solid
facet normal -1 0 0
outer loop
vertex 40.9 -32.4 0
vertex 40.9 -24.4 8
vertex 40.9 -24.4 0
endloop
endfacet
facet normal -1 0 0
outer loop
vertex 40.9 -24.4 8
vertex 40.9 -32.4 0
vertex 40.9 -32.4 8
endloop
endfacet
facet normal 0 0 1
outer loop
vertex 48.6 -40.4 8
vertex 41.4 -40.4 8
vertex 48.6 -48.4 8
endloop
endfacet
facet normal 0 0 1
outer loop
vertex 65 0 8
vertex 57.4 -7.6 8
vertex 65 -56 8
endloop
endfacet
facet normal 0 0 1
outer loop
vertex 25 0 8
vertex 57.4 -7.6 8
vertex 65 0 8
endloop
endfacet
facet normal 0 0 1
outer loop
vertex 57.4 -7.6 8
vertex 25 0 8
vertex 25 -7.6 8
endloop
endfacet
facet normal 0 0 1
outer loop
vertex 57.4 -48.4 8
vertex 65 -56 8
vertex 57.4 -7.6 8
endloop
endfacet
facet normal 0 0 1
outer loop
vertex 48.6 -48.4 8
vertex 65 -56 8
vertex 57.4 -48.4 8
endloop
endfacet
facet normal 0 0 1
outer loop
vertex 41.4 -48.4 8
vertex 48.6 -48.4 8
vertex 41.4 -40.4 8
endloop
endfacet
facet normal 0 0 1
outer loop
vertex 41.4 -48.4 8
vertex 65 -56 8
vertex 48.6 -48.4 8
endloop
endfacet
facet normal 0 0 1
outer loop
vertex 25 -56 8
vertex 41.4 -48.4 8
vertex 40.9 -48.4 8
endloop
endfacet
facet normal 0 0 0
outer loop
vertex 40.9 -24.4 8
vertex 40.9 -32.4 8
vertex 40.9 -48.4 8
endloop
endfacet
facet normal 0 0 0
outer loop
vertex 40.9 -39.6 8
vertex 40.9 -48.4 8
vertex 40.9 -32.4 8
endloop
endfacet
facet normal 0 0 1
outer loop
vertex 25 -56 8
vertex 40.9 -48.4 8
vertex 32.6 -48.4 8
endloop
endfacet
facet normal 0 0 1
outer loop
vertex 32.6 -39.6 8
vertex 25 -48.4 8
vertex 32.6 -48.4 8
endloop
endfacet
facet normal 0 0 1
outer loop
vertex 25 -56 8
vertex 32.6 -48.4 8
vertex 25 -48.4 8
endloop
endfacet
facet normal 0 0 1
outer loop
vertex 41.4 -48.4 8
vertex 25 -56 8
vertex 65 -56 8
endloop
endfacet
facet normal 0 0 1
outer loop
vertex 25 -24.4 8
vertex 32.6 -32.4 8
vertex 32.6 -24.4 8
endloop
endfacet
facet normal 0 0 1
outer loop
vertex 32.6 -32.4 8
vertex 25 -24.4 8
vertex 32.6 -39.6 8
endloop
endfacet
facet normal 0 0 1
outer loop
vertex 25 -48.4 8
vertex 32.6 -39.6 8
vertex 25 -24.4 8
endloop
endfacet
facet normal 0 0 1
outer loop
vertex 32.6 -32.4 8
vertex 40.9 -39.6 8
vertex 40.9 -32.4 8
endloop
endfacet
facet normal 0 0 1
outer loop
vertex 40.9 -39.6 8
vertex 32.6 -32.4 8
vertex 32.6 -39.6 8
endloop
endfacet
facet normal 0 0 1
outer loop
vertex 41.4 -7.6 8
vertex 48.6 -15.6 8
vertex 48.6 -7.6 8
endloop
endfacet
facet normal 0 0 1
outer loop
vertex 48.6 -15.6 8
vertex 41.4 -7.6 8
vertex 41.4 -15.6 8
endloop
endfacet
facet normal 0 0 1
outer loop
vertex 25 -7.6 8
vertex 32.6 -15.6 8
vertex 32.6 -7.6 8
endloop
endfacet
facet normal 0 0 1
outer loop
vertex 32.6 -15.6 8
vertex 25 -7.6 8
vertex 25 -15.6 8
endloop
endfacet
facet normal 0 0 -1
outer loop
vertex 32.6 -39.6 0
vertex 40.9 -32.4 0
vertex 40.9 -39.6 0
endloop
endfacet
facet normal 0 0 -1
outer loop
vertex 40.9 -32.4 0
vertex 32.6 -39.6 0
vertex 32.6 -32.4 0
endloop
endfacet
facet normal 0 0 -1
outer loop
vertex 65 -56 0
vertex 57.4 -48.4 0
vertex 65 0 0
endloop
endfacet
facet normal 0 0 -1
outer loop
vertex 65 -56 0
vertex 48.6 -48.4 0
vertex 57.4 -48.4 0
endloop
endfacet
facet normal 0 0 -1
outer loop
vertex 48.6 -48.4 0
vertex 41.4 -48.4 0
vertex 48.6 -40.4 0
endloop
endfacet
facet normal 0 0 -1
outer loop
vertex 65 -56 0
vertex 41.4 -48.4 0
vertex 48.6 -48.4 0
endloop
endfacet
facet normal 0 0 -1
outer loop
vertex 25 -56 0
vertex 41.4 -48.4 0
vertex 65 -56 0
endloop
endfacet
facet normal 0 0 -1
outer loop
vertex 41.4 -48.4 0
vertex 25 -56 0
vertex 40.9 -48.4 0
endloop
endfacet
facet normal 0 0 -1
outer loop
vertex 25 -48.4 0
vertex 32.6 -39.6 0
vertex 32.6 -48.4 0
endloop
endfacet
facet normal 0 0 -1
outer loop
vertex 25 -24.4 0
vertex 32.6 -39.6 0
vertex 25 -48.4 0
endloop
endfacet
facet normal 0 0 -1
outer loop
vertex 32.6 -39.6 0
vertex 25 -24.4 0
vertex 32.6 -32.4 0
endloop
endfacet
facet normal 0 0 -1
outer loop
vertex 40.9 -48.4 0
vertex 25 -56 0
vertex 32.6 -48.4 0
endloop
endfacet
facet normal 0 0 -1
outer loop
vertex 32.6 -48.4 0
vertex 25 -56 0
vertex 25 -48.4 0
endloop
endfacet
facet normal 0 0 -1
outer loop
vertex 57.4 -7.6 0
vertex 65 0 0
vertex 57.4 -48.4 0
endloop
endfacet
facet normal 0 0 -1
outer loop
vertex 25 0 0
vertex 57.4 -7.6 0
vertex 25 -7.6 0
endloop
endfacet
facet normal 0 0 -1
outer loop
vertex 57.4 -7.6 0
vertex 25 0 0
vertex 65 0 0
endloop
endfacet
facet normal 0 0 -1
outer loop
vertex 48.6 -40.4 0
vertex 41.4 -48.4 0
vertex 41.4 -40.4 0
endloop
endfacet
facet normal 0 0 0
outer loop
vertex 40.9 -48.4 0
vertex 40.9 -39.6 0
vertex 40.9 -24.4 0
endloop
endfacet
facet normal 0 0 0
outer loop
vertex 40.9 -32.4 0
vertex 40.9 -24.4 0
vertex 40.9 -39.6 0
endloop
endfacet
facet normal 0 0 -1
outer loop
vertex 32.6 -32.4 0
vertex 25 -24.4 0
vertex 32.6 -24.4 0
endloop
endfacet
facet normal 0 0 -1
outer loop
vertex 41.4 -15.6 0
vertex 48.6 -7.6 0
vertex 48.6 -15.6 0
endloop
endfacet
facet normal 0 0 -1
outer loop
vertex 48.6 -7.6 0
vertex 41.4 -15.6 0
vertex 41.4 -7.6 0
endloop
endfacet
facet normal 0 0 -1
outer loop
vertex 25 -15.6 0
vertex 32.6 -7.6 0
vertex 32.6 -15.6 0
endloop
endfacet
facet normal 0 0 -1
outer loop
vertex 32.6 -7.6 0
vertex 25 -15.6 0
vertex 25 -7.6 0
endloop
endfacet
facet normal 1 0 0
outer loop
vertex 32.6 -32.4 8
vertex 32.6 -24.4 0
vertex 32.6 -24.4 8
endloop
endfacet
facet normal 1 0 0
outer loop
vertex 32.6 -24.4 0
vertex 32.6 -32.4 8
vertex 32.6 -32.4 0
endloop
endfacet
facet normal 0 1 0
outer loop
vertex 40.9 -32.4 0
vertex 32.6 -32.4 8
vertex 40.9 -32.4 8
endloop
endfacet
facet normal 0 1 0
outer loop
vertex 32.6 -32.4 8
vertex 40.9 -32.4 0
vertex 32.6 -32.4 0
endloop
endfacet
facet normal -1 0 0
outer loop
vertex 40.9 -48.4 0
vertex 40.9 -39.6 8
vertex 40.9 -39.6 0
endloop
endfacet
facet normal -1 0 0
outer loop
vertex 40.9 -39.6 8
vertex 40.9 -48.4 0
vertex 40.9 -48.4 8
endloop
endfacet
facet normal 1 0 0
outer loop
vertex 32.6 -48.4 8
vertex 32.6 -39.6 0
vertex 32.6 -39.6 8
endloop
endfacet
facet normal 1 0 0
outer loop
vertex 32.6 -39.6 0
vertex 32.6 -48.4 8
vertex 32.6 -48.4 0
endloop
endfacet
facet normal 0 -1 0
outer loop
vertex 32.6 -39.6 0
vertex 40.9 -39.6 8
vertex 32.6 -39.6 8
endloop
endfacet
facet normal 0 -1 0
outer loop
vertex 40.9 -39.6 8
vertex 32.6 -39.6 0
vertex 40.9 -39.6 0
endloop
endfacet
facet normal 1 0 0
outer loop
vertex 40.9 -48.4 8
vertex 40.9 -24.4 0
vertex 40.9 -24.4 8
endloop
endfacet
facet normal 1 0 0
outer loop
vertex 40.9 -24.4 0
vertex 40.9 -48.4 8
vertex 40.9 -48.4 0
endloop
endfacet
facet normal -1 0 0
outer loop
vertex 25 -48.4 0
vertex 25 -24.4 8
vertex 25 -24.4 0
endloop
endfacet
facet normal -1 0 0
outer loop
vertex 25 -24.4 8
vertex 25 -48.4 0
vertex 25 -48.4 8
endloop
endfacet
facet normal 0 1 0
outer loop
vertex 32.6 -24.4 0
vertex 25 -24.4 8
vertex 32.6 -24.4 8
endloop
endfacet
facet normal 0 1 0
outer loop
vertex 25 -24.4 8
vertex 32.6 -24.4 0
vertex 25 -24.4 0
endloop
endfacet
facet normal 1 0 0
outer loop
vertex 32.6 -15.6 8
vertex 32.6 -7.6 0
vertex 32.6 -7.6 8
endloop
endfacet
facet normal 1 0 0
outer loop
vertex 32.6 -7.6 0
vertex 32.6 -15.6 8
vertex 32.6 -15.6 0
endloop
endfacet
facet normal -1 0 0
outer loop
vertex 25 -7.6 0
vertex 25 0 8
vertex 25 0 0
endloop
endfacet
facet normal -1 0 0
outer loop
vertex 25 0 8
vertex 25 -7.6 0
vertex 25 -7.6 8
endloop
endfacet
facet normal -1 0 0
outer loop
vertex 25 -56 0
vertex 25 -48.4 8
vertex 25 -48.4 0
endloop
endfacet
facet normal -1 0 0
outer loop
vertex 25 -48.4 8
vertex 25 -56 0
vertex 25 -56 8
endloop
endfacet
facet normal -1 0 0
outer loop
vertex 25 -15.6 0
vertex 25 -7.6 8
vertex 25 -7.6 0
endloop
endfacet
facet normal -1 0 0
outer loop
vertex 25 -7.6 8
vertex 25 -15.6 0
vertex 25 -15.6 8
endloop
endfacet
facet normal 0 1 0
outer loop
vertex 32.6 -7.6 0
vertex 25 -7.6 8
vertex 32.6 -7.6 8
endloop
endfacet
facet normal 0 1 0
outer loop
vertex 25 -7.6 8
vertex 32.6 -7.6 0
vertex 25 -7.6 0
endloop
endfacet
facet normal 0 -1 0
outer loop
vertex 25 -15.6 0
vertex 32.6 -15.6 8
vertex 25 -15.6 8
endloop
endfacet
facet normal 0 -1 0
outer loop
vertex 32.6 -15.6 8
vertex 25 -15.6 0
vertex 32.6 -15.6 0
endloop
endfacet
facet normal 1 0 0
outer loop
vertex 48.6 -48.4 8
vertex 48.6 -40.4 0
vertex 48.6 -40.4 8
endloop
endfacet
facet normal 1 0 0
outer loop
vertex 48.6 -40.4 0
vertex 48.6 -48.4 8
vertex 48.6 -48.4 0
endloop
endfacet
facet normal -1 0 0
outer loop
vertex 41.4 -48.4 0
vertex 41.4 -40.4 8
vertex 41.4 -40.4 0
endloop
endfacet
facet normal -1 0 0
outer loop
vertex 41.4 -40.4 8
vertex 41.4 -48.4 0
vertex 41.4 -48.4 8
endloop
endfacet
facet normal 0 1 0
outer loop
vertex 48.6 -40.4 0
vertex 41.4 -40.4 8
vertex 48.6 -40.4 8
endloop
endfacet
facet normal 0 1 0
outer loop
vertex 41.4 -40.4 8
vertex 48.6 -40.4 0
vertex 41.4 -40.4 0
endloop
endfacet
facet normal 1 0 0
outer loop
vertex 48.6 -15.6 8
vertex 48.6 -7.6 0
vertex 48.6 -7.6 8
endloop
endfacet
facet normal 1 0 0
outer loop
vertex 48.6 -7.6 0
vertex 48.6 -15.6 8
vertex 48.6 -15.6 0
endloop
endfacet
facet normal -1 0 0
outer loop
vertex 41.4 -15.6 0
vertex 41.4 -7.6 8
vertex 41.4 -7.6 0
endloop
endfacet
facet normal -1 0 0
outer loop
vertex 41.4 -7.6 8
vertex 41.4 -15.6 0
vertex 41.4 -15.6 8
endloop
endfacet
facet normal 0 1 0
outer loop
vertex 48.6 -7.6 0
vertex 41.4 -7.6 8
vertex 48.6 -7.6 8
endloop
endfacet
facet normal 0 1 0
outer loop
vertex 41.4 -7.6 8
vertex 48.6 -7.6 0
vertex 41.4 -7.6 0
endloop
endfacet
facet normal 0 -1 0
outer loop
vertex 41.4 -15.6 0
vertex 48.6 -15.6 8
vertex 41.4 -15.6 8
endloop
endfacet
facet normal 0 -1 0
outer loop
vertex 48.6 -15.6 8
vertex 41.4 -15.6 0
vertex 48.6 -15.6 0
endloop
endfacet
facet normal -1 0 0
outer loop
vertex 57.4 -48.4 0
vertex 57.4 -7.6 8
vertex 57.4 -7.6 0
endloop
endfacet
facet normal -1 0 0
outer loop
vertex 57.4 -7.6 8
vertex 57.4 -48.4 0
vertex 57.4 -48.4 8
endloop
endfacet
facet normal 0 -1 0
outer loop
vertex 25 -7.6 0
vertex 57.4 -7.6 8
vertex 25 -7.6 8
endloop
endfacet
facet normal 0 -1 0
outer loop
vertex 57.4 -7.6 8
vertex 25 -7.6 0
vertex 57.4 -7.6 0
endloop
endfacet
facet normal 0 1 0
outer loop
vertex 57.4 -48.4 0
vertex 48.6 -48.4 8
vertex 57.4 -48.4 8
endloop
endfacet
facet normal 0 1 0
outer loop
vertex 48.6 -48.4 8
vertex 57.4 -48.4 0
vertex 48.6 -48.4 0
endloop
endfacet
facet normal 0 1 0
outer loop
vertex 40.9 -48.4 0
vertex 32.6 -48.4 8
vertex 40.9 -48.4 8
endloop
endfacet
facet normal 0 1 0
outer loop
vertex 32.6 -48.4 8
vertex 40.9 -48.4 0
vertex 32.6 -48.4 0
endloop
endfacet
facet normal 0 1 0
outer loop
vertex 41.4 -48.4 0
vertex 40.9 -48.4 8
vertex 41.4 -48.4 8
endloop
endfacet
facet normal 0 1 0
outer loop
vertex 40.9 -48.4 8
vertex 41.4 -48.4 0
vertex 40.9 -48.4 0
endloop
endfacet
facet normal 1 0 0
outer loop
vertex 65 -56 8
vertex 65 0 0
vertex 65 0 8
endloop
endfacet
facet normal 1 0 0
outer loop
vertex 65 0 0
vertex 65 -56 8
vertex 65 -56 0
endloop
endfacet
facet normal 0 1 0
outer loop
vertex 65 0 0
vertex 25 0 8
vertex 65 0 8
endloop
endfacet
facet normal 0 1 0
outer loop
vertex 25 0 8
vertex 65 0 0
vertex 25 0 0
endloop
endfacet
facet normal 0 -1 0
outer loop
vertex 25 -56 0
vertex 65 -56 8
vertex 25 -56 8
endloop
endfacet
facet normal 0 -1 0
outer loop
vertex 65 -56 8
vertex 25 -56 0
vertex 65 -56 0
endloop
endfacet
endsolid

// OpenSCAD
difference() {
  translate([45.0000000000, -28.0000000000, 4.0000000000]) {
    scale([40.0000000000, 56.0000000000, 8.0000000000]) {
      translate([-0.5000000000, -0.5000000000, -0.5000000000]) {
        cube([1, 1, 1]);
      }
    }
  }
  difference() {
    translate([41.1999210000, -27.9999180000, 4.0000000000]) {
      scale([32.4000000000, 40.8000000000, 8.0000000000]) {
        translate([-0.5000000000, -0.5000000000, -0.5000000000]) {
          cube([1, 1, 1]);
        }
      }
    }
    union() {
      union() {
        union() {
          difference() {
            translate([32.9500470000, -36.4000800000, 4.0000000000]) {
              scale([15.9000000000, 24.0000000000, 8.0000000000]) {
                translate([-0.5000000000, -0.5000000000, -0.5000000000]) {
                  cube([1, 1, 1]);
                }
              }
            }
            union() {
              translate([36.7500000000, -28.4000000000, 4.0000000000]) {
                scale([8.3000000000, 8.0000000000, 8.0000000000]) {
                  translate([-0.5000000000, -0.5000000000, -0.5000000000]) {
                    cube([1, 1, 1]);
                  }
                }
              }
              translate([36.7500000000, -44.0000000000, 4.0000000000]) {
                scale([8.3000000000, 8.8000000000, 8.0000000000]) {
                  translate([-0.5000000000, -0.5000000000, -0.5000000000]) {
                    cube([1, 1, 1]);
                  }
                }
              }
            }
          }
          translate([28.8000000000, -11.6000000000, 4.0000000000]) {
            scale([7.6000000000, 8.0000000000, 8.0000000000]) {
              translate([-0.5000000000, -0.5000000000, -0.5000000000]) {
                cube([1, 1, 1]);
              }
            }
          }
        }
        translate([45.0000000000, -44.4000000000, 4.0000000000]) {
          scale([7.2000000000, 8.0000000000, 8.0000000000]) {
            translate([-0.5000000000, -0.5000000000, -0.5000000000]) {
              cube([1, 1, 1]);
            }
          }
        }
      }
      translate([45.0000000000, -11.6000000000, 4.0000000000]) {
        scale([7.2000000000, 8.0000000000, 8.0000000000]) {
          translate([-0.5000000000, -0.5000000000, -0.5000000000]) {
            cube([1, 1, 1]);
          }
        }
      }
    }
  }
}
